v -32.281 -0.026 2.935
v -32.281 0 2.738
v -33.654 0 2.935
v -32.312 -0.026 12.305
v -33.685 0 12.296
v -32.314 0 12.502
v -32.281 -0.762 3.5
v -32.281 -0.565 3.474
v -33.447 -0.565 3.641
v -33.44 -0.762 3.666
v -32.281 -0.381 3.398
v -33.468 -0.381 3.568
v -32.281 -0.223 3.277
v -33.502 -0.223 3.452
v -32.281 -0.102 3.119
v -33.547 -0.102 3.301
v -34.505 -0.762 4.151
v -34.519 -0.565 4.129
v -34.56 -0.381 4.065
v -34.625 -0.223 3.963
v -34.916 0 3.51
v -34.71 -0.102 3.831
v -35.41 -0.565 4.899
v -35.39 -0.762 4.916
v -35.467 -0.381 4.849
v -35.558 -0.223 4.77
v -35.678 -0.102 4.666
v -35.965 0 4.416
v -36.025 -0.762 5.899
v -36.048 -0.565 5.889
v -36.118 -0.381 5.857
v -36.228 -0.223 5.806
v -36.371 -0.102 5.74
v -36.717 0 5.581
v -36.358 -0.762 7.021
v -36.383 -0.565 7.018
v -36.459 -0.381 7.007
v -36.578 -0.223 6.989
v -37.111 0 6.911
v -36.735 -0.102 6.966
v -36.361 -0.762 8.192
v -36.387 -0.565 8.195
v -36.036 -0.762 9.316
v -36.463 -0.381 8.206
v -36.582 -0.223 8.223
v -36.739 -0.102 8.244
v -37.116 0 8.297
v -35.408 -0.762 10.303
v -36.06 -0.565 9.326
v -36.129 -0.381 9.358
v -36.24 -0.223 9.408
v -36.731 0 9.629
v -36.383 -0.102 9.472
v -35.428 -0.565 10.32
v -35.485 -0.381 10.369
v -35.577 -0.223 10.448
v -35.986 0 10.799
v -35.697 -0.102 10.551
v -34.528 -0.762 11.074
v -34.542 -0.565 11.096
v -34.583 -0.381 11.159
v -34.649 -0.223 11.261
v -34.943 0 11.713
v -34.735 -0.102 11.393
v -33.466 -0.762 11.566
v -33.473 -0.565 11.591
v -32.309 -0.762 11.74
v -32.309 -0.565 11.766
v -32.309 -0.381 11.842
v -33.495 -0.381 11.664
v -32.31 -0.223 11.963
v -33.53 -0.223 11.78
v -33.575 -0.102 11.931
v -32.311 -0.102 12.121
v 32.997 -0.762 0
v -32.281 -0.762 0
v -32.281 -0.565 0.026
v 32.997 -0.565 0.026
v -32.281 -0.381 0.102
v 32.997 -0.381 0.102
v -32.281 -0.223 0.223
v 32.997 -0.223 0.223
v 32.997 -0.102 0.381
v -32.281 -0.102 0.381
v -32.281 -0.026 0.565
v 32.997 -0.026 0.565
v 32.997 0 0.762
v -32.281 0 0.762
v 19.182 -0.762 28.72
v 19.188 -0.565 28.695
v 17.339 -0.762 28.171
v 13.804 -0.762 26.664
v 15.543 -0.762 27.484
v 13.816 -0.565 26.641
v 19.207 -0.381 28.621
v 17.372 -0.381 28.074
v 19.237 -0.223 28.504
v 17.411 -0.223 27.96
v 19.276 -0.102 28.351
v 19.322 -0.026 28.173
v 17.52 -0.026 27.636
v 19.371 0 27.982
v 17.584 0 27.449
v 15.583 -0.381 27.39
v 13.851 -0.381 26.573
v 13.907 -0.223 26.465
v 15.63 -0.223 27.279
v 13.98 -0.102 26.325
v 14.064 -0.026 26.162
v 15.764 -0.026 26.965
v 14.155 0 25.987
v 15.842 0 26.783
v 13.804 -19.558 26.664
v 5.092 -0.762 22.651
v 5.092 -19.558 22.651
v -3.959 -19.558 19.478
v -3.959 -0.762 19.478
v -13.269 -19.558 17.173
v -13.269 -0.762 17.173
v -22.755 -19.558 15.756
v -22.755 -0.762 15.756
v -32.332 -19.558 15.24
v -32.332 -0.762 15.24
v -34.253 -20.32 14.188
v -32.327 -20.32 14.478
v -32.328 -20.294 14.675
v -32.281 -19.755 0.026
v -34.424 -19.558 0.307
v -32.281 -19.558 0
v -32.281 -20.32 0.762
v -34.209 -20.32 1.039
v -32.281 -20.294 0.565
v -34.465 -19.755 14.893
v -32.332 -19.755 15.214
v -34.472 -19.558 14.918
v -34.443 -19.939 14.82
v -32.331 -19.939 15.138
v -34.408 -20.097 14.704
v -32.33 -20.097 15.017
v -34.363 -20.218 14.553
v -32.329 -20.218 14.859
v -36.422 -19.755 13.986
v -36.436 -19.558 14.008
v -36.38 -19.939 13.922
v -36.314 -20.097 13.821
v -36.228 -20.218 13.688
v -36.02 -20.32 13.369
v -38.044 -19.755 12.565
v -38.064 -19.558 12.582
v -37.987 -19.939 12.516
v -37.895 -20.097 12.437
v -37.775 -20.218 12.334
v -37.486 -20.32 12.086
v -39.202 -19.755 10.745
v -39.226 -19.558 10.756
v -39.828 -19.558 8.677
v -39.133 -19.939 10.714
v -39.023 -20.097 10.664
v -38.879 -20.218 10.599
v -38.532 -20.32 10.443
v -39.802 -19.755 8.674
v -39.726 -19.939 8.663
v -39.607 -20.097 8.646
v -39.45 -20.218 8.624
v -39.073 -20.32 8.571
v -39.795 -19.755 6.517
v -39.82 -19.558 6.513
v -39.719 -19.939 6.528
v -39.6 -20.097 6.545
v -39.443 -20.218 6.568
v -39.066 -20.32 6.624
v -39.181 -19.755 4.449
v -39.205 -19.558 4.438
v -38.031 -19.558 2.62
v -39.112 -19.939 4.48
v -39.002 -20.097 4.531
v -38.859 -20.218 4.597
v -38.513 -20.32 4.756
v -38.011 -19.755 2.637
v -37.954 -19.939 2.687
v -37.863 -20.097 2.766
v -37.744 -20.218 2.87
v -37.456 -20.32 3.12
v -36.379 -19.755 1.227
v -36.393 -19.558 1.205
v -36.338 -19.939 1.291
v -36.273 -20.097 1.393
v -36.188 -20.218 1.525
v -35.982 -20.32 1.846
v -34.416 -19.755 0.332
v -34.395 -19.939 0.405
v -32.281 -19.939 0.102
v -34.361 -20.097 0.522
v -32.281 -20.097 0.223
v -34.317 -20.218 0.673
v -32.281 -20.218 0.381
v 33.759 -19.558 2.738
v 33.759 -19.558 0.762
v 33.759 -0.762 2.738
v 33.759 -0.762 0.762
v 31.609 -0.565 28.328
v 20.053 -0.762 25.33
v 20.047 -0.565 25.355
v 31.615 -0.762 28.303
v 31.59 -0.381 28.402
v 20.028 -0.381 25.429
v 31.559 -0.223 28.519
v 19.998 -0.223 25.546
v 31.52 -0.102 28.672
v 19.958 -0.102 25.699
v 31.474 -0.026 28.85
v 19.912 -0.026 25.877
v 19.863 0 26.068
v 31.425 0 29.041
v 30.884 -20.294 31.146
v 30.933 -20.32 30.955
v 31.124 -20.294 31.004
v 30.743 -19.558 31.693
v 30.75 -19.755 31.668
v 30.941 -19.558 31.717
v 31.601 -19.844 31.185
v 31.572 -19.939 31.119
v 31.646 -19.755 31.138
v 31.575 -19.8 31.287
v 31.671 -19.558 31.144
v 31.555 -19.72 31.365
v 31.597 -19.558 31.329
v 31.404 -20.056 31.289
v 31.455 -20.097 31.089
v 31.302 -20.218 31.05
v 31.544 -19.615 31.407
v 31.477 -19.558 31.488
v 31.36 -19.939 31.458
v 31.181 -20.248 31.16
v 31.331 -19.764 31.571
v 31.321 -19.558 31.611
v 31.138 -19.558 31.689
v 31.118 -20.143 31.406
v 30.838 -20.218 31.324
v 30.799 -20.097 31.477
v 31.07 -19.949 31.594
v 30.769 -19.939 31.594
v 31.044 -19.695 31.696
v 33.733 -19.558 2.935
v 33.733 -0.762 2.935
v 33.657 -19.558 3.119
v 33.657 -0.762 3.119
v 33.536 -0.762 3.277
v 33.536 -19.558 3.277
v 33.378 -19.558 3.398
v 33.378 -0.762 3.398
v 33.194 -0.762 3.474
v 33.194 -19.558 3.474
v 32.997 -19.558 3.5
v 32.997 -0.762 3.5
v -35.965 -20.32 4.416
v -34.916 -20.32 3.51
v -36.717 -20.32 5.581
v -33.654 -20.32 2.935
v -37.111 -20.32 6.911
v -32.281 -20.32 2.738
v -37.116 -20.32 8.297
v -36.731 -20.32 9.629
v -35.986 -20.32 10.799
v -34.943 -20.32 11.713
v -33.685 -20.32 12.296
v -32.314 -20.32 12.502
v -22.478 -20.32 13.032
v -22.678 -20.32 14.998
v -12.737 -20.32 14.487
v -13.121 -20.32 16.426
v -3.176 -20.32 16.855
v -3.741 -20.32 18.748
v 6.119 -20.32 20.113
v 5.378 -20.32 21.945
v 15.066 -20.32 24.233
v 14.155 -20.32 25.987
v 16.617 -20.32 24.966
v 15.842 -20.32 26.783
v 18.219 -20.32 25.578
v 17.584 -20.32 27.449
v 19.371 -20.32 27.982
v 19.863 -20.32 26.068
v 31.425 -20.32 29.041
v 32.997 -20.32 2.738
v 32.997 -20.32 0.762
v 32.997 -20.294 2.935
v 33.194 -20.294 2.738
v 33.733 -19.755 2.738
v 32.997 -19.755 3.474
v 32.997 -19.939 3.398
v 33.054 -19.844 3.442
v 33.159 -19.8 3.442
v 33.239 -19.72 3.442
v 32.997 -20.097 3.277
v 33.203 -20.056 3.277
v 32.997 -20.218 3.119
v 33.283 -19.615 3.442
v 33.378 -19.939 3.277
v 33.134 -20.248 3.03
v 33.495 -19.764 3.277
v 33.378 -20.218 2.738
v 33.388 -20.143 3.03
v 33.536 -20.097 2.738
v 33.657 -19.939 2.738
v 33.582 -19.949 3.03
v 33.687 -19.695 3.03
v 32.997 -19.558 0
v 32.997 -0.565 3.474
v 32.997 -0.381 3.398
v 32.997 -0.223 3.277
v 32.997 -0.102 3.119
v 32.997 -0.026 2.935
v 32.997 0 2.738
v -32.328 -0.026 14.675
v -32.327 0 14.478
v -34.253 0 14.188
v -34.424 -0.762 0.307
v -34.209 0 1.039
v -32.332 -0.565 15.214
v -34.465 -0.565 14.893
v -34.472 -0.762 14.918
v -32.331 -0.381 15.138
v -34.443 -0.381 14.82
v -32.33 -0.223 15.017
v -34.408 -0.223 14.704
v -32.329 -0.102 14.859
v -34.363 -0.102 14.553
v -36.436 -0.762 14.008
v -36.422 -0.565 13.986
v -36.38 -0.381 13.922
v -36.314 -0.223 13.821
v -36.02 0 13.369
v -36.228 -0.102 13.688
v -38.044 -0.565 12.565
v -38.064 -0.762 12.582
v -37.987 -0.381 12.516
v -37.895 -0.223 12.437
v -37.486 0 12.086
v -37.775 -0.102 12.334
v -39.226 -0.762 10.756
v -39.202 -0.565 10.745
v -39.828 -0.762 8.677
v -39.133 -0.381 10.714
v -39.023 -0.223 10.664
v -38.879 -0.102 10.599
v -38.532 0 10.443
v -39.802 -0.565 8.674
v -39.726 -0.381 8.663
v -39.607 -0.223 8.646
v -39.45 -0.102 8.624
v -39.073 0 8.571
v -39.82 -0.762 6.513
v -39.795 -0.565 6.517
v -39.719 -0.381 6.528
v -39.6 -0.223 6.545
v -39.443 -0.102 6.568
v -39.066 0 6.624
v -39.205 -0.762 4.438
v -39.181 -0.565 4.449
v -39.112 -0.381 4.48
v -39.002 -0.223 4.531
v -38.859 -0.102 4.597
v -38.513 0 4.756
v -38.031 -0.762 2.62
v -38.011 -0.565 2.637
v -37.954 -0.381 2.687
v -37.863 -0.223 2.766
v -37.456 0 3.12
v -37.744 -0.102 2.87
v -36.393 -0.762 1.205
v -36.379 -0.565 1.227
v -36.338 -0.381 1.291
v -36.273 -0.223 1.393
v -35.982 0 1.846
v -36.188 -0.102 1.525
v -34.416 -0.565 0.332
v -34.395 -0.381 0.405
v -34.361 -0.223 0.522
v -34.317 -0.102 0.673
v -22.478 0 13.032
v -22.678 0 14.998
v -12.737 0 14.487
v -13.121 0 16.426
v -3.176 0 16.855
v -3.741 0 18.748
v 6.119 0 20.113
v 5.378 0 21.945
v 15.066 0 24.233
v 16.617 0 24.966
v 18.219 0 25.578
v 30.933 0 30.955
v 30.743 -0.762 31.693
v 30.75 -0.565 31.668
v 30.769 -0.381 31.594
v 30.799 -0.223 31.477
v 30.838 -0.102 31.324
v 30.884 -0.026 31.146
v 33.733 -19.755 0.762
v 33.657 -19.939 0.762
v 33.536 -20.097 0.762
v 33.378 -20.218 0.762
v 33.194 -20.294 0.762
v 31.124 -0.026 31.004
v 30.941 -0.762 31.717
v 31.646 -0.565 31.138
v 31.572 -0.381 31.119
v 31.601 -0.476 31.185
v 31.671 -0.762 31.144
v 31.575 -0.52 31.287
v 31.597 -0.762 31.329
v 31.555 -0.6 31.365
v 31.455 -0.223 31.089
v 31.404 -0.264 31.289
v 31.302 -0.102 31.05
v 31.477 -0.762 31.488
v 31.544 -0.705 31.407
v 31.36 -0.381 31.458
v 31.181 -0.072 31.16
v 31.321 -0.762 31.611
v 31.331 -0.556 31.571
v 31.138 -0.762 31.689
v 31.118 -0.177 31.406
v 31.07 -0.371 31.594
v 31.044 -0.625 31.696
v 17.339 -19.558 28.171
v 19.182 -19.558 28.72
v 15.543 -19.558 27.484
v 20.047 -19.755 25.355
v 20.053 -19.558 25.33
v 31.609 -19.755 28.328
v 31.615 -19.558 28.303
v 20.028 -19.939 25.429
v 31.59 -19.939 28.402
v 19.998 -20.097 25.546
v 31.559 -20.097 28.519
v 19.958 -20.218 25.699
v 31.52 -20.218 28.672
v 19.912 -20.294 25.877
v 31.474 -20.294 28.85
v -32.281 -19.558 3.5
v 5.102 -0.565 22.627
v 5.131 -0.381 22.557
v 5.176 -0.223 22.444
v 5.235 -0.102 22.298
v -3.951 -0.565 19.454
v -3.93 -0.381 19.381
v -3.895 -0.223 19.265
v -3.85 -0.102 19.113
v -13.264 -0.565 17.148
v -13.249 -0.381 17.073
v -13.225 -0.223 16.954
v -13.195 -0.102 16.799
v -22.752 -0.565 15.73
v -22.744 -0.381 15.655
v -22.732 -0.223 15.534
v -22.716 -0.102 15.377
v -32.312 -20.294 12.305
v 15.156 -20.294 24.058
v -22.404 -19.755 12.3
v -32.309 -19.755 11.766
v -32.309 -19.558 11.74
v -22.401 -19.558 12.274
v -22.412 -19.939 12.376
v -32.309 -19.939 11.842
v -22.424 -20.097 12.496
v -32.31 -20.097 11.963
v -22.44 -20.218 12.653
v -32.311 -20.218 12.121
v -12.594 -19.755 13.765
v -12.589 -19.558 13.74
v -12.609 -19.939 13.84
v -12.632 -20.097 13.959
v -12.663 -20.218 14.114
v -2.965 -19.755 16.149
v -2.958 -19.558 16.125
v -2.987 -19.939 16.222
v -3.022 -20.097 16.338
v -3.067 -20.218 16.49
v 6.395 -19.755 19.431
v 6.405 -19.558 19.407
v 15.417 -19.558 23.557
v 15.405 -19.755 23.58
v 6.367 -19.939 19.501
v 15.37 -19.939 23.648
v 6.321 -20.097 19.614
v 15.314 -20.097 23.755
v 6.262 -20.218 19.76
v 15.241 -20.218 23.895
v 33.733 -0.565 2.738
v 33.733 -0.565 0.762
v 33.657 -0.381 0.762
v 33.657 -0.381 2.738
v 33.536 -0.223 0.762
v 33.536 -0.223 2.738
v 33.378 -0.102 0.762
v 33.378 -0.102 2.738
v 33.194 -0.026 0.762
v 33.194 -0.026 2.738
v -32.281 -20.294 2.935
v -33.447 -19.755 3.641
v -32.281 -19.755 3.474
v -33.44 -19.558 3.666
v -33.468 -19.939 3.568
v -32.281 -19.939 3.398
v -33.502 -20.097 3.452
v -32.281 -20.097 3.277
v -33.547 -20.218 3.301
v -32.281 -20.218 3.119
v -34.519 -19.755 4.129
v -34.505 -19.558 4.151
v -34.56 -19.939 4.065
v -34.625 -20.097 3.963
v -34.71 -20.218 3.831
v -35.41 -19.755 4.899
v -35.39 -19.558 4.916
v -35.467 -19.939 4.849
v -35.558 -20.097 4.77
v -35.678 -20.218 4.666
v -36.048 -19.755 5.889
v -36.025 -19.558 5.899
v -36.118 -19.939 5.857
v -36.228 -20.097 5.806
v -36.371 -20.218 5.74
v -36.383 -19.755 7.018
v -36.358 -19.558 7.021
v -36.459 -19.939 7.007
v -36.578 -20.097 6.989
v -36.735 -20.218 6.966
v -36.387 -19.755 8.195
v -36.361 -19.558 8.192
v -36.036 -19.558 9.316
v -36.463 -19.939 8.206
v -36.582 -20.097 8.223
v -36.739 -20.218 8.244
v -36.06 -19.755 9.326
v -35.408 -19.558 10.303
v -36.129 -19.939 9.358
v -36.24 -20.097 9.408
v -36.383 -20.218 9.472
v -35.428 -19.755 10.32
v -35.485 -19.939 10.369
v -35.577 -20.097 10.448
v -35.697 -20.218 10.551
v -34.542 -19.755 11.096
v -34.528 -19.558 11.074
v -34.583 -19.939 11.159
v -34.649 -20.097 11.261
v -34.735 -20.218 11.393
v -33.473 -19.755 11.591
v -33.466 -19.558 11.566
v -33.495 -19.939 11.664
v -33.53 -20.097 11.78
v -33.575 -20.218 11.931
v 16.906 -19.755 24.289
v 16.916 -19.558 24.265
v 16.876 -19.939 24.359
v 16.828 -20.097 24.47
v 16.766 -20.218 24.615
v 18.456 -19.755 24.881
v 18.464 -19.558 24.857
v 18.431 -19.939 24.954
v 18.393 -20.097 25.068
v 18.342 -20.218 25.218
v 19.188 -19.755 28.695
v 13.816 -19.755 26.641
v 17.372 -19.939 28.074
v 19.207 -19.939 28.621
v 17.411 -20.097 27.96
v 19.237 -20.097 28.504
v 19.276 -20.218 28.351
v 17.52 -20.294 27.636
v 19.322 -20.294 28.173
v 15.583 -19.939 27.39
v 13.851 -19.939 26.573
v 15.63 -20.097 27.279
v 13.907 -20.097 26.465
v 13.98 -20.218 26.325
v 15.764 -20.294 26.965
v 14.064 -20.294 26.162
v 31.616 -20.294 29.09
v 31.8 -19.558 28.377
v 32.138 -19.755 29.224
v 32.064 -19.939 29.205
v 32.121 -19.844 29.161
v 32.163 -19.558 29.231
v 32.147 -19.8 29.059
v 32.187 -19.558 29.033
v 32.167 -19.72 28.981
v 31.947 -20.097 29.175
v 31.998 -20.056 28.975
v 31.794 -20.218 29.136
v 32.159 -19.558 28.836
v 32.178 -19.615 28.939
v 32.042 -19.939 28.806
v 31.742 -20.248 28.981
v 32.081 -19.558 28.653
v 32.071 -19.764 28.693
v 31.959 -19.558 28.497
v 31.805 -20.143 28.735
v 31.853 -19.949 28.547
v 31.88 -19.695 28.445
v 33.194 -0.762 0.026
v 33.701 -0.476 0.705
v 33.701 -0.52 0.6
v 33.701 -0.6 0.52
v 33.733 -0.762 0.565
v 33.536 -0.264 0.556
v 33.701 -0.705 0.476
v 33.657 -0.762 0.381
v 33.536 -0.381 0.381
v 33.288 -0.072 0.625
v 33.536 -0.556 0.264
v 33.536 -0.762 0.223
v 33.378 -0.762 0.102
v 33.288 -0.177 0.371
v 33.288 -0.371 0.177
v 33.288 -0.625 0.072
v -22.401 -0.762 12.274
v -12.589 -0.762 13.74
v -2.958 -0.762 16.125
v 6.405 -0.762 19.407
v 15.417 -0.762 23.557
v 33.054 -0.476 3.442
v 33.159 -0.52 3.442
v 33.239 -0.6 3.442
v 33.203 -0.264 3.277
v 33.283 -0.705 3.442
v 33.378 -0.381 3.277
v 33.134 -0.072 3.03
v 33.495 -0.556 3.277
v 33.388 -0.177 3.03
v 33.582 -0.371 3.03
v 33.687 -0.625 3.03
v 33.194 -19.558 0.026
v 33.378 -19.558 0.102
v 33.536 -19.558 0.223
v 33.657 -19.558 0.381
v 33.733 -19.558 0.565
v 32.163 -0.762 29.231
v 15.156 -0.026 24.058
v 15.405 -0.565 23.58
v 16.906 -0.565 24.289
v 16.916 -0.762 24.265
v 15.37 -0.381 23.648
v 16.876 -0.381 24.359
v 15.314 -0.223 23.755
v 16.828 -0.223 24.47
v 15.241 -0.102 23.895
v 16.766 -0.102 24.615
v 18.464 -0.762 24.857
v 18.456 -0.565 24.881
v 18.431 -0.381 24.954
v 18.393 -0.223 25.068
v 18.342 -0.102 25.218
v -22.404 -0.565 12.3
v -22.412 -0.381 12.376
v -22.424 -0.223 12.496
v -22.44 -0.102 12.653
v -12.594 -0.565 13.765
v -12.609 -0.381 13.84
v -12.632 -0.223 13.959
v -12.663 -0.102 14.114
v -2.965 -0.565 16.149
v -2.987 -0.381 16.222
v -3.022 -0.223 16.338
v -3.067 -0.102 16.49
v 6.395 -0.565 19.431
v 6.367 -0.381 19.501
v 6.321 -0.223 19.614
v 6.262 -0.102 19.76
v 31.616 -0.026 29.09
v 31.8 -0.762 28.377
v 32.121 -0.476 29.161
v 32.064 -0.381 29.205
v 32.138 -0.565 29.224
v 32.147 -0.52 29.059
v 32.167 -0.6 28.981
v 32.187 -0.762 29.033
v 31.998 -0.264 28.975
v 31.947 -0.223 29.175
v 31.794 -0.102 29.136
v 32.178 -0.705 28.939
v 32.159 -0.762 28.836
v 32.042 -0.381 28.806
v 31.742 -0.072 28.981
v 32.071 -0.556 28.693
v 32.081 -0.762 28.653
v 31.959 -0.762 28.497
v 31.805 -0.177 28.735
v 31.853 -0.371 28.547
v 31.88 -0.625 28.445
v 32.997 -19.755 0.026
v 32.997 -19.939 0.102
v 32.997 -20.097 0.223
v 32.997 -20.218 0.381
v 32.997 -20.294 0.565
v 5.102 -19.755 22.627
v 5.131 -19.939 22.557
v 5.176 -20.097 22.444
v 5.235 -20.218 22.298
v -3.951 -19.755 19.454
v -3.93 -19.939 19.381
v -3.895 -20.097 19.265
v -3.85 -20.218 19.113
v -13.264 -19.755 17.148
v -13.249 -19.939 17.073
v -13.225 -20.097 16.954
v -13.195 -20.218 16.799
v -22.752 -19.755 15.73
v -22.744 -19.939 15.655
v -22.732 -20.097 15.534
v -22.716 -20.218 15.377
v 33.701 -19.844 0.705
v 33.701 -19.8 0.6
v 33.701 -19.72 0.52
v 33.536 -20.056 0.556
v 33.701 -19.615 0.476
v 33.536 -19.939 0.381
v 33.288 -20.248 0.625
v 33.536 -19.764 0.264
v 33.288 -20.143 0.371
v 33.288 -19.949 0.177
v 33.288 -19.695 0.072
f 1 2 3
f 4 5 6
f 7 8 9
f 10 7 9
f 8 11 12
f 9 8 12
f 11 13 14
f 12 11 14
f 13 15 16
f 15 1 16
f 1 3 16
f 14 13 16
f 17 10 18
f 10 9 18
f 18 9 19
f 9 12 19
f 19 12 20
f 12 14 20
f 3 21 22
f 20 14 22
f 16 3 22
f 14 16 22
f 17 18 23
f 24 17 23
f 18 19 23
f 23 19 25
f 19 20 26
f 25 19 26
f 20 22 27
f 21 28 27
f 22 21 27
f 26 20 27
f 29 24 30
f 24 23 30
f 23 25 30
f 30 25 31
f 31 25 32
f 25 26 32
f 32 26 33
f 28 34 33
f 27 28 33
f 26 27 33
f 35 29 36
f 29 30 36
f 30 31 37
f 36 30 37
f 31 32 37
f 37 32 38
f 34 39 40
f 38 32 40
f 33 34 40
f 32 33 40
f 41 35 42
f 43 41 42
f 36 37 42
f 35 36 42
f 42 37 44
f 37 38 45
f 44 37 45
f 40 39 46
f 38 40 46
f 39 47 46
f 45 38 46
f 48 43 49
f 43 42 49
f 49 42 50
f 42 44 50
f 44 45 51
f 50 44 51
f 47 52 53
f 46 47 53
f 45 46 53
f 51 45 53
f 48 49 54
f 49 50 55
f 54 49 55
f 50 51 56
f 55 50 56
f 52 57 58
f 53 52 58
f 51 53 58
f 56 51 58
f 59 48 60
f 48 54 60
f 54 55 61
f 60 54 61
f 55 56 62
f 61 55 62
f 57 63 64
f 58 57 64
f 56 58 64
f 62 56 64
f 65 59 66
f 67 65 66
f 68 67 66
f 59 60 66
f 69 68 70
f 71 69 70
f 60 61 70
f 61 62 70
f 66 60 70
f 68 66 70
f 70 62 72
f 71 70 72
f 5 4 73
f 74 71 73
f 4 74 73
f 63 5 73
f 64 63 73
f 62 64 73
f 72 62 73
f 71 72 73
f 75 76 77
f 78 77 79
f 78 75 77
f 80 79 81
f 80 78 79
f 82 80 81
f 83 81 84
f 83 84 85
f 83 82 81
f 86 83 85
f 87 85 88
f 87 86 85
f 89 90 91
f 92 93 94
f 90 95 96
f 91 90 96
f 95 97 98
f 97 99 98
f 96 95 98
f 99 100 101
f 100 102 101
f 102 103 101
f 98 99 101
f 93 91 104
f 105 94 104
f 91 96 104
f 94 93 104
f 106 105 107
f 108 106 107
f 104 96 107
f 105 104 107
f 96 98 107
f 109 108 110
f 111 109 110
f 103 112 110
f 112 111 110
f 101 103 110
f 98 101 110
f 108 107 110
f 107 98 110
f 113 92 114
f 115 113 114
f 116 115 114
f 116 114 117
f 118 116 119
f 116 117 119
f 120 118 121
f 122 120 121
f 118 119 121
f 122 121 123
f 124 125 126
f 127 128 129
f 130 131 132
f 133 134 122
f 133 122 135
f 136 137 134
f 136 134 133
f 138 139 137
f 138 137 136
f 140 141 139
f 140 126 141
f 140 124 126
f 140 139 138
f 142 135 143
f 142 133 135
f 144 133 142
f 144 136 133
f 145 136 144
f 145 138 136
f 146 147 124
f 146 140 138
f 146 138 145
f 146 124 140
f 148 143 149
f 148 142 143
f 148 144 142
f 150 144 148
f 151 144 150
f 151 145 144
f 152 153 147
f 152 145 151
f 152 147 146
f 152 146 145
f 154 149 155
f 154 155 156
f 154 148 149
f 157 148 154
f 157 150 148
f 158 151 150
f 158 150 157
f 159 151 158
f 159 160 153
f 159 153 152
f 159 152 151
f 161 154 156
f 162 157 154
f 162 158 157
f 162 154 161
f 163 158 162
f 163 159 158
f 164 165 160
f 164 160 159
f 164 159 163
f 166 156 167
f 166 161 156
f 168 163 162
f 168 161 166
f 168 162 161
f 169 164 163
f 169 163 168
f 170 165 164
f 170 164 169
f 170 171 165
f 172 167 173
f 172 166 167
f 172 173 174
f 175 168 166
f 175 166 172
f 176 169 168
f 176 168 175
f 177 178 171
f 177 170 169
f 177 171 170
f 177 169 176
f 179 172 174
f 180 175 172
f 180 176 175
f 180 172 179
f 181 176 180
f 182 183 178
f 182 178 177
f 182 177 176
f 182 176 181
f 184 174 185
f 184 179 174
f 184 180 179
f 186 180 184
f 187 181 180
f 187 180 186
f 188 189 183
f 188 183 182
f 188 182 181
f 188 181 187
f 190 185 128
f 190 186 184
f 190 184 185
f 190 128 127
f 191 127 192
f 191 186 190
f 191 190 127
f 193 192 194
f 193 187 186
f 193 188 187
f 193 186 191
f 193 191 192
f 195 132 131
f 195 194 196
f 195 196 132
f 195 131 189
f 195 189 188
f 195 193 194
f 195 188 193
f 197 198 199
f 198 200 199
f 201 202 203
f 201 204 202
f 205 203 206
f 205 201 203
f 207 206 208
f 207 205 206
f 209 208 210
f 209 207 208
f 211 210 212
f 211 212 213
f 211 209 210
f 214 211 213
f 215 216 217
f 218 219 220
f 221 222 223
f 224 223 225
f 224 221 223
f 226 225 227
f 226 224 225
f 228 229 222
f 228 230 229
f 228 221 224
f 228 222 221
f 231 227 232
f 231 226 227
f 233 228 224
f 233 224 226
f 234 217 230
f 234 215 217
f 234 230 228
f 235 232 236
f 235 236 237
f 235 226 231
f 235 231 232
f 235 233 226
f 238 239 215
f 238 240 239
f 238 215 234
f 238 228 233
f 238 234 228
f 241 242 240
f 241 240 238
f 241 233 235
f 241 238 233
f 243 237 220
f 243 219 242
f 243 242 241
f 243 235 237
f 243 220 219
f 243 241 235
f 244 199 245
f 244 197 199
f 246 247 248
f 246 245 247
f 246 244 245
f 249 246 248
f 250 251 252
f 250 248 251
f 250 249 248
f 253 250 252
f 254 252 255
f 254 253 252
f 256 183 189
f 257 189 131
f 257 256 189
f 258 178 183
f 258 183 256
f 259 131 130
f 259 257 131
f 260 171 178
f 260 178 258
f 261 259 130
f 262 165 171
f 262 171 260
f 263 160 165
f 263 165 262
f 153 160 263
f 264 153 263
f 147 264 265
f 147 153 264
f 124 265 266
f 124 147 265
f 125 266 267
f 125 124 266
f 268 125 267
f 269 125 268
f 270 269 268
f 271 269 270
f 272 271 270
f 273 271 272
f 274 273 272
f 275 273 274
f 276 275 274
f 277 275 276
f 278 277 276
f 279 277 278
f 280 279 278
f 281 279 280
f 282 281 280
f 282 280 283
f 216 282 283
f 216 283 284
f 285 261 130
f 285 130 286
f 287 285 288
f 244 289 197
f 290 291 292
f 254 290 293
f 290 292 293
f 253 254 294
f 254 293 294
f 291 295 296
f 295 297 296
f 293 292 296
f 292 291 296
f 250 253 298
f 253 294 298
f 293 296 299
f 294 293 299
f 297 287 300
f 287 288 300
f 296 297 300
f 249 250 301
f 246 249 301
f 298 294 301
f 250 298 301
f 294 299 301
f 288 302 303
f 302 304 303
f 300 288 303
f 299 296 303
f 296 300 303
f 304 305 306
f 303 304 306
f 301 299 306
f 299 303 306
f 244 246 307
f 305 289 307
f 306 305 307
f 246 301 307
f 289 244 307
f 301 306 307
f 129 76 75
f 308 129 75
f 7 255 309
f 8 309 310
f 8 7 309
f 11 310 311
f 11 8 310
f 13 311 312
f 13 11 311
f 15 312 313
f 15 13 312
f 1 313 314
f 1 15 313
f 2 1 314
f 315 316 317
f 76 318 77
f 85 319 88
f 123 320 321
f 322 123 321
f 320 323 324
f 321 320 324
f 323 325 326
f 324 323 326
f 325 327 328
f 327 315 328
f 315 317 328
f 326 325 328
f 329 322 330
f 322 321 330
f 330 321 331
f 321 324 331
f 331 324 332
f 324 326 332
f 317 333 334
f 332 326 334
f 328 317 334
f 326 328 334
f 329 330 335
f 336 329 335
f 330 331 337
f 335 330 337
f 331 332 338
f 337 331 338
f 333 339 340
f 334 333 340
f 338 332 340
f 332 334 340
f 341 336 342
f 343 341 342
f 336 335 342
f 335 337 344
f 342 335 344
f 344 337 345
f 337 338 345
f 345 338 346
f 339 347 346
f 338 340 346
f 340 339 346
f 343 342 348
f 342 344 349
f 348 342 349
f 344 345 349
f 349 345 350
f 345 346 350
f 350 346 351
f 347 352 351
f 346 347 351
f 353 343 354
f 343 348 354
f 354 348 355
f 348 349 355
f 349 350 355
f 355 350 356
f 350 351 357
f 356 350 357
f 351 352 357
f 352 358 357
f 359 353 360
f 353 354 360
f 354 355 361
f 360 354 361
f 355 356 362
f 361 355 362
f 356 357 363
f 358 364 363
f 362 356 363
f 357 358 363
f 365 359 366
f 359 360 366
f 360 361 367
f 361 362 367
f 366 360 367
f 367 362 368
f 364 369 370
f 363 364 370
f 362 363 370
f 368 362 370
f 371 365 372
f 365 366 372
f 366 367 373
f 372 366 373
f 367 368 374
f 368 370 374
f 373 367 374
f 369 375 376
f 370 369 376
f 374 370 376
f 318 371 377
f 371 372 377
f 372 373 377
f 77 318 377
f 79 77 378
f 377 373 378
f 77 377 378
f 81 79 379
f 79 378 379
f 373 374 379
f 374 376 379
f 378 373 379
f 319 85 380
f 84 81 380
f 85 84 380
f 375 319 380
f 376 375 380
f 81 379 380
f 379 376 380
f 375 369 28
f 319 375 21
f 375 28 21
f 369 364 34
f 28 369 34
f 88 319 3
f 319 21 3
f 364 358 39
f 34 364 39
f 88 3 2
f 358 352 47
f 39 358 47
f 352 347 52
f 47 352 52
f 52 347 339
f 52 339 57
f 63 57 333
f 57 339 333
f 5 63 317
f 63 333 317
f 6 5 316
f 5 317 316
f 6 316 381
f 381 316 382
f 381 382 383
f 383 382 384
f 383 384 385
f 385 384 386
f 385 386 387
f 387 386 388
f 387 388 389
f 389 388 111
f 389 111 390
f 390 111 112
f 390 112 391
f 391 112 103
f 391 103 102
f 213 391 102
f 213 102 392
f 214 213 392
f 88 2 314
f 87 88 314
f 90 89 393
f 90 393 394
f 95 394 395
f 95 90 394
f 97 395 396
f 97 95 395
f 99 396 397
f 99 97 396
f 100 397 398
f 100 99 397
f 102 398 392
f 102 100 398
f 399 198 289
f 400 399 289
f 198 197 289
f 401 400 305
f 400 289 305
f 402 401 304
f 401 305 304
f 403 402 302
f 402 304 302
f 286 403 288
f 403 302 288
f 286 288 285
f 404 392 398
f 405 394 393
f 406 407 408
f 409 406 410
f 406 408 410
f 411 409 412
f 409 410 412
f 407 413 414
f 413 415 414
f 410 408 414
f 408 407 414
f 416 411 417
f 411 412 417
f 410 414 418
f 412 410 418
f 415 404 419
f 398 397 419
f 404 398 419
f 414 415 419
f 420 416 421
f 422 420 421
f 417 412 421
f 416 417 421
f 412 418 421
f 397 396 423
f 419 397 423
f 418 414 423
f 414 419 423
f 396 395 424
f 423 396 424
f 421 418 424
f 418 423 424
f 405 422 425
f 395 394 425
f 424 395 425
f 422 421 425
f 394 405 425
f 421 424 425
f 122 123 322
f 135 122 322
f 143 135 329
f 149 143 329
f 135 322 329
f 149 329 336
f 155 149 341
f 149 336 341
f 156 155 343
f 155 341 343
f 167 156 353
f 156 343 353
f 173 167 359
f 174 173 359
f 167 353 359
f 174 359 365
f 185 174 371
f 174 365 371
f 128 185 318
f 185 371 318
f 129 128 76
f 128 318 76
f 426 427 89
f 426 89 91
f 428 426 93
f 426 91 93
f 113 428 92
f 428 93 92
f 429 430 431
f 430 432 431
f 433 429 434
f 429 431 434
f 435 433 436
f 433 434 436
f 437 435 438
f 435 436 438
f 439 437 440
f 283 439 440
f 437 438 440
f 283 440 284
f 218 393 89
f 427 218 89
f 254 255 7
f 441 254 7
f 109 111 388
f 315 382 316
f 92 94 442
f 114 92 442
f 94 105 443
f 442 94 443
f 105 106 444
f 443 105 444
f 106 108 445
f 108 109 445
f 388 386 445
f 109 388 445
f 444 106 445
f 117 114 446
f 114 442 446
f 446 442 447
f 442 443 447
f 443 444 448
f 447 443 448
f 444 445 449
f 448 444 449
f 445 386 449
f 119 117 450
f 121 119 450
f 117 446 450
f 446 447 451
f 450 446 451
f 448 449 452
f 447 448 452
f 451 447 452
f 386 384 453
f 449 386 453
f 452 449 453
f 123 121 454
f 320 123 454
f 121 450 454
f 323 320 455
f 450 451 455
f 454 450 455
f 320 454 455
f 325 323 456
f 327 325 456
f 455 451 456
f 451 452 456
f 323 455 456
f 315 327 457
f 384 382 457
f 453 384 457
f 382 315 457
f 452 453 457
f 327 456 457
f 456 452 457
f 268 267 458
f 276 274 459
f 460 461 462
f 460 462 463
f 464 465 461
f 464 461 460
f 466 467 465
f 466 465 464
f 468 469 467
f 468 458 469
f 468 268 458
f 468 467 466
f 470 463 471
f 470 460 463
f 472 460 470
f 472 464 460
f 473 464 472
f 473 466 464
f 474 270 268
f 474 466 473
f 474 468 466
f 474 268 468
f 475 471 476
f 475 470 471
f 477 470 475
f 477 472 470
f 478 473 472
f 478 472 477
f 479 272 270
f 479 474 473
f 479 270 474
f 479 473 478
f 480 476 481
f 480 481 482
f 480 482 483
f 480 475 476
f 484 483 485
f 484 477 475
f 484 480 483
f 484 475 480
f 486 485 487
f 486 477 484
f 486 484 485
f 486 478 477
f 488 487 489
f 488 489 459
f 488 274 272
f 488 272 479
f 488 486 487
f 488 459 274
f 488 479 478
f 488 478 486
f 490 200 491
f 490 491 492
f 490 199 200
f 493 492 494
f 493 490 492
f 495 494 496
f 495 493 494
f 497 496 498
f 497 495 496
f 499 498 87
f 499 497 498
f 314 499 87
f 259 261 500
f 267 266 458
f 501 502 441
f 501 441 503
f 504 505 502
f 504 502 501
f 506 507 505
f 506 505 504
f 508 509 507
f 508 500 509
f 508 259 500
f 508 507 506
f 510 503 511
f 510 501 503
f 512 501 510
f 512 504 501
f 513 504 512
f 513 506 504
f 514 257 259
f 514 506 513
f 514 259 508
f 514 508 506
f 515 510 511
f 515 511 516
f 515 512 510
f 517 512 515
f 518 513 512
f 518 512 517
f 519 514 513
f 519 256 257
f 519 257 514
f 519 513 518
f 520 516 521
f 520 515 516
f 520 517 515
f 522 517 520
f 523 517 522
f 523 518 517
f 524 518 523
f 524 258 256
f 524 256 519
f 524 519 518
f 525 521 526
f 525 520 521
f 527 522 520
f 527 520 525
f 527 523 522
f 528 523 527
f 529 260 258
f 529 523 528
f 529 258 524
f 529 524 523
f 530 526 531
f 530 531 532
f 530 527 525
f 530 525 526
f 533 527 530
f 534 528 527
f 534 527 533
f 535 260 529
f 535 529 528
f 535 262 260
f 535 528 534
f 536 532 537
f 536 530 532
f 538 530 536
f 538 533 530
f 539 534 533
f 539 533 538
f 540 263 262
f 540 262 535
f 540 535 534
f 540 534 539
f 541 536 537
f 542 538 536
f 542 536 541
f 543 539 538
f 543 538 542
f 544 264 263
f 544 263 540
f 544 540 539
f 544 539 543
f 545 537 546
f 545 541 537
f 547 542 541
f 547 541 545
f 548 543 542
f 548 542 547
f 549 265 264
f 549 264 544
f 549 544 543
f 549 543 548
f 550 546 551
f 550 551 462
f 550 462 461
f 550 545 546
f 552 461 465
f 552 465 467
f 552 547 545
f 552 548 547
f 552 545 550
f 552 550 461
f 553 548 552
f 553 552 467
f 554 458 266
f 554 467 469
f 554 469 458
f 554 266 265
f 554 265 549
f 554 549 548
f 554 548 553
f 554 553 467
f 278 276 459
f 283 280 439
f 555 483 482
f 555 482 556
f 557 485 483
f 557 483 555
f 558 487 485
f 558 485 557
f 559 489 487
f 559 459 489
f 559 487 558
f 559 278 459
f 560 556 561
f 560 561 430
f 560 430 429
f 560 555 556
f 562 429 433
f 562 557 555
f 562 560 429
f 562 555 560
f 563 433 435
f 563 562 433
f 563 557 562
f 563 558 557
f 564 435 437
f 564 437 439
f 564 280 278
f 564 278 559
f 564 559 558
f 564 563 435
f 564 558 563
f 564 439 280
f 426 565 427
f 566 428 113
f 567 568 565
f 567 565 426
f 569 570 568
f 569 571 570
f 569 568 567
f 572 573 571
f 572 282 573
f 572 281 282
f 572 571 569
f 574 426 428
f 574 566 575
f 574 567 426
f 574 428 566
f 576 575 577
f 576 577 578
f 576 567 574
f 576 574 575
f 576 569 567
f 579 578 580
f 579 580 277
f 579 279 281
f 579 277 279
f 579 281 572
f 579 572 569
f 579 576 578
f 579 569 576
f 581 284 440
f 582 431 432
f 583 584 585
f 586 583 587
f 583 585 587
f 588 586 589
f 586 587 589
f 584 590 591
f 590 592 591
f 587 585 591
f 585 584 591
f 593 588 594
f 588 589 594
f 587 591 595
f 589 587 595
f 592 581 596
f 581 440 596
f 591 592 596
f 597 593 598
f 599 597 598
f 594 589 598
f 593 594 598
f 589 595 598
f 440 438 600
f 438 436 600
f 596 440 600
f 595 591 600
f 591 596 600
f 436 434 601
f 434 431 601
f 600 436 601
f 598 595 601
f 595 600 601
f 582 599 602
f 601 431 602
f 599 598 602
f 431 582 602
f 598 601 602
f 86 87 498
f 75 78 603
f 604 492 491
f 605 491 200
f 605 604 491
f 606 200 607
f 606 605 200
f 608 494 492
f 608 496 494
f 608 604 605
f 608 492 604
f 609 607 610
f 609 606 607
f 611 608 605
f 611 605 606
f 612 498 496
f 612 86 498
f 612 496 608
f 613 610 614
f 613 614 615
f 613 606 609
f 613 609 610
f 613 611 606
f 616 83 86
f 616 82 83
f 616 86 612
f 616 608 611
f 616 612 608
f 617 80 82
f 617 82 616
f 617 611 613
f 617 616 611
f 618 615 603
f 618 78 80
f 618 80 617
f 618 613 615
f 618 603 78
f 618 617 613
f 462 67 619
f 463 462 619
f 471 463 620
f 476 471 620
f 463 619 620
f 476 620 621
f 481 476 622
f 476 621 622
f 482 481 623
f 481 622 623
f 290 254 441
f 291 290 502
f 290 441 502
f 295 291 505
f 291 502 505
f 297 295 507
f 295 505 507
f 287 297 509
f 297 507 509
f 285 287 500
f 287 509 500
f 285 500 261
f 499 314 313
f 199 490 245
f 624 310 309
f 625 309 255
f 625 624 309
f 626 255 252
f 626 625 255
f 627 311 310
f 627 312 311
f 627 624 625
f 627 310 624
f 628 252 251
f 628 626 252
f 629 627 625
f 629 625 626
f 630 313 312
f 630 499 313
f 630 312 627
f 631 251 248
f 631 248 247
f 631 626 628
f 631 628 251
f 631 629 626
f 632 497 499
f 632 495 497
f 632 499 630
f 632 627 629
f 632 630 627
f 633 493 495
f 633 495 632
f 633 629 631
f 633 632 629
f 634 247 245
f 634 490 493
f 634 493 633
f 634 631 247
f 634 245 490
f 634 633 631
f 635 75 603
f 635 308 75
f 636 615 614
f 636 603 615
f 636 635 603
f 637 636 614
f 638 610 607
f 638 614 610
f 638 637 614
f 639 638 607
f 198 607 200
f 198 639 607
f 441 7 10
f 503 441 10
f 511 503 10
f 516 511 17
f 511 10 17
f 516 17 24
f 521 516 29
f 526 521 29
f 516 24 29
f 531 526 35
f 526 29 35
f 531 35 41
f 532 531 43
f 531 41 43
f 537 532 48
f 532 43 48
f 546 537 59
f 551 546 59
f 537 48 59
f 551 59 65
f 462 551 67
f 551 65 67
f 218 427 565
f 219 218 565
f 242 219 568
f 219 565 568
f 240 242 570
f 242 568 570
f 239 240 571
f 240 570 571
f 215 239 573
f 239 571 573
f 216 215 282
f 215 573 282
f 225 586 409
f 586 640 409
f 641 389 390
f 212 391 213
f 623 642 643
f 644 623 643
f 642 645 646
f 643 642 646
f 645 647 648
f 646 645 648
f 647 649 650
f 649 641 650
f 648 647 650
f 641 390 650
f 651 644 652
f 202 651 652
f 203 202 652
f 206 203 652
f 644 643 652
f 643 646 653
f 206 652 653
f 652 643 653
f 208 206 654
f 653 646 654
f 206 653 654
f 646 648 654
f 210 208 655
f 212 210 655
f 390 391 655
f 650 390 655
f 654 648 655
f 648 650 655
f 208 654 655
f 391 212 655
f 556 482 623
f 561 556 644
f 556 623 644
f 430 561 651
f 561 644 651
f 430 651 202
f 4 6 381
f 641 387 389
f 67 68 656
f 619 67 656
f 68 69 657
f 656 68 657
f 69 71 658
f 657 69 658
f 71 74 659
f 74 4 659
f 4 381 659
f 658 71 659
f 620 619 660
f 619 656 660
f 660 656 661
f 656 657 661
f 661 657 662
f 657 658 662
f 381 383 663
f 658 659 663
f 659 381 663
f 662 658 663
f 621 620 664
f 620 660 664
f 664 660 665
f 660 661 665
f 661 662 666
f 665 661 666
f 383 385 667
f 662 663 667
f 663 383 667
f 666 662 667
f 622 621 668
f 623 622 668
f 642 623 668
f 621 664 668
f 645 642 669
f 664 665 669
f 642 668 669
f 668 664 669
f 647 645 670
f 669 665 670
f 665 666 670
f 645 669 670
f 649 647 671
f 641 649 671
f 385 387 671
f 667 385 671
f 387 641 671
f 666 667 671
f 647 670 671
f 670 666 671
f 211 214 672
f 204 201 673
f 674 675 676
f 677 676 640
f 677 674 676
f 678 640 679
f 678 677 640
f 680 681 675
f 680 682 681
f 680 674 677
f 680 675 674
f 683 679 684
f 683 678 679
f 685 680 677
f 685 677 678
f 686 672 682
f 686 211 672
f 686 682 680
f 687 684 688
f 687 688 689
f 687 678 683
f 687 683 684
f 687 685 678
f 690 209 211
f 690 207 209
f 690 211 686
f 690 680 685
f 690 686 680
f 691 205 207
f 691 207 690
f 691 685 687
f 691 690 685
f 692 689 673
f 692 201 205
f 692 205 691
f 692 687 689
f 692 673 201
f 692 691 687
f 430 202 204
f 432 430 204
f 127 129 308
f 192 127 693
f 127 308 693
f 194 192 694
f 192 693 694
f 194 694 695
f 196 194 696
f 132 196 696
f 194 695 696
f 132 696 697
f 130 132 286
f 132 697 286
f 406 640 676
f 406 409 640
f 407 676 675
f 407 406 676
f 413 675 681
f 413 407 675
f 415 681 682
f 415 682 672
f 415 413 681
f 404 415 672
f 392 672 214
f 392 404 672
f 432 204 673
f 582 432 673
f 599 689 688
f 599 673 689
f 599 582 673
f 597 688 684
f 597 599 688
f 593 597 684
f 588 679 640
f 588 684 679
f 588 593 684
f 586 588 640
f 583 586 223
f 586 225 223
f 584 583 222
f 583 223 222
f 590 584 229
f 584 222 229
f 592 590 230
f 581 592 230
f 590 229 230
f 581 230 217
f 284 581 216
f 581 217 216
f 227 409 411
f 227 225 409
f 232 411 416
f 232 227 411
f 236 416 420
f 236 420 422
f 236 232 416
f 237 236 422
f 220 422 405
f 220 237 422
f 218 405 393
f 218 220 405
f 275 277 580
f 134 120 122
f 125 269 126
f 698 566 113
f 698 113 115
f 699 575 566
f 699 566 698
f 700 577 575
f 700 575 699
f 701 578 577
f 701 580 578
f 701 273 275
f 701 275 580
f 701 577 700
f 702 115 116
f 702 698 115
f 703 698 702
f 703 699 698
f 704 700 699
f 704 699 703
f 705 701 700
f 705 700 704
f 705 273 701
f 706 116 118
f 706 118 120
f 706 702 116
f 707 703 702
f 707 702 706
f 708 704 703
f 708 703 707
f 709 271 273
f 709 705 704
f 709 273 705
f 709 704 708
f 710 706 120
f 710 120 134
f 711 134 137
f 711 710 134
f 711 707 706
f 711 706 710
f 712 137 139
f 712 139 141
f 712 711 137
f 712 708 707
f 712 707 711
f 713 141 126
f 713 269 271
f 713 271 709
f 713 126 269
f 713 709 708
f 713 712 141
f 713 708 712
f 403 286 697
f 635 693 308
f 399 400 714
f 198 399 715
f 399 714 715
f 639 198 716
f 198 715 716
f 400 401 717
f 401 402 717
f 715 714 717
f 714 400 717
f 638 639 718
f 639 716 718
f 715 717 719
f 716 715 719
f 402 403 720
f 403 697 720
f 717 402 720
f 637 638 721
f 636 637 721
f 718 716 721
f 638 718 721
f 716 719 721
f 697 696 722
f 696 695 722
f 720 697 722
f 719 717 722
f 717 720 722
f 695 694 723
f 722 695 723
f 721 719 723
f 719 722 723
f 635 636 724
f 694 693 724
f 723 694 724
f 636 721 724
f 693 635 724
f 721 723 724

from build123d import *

# Parameters (mm, degrees)
F1_DEPTH = 20.32
F2_R     = 0.762


with BuildPart() as f1:
    # F0 (on Front) → F1 (new body)
    with BuildSketch(Plane.XZ):
        with BuildLine():
            Line((-32.2812777423, 0), (33.7587222577, 0))
            Line((33.7587222577, 0), (33.7587222577, 3.5))
            Line((33.7587222577, 3.5), (-32.2812777423, 3.5))
            ThreePointArc((-32.2812777423, 3.5), (-36.4012550506, 7.6063259449), (-32.308625702, 11.7399092331))
            ThreePointArc((-32.308625702, 11.7399092331), (-7.7452704082, 14.8185162016), (15.4165966965, 23.5571749303))
            ThreePointArc((15.4165966965, 23.5571749303), (17.6844448263, 24.575463703), (20.0530860269, 25.3301729364))
            Line((20.0530860269, 25.3301729364), (32.3530167072, 28.49272021))
            Line((32.3530167072, 28.49272021), (31.481448561, 31.8824648857))
            Line((31.481448561, 31.8824648857), (19.1815178806, 28.7199176121))
            ThreePointArc((19.1815178806, 28.7199176121), (16.4343267164, 27.8445927478), (13.8040371048, 26.6635637603))
            ThreePointArc((13.8040371048, 26.6635637603), (-8.5865023609, 18.215916502), (-32.331858192, 15.2398321253))
            ThreePointArc((-32.331858192, 15.2398321253), (-39.9012357736, 7.5947096359), (-32.2812777423, 0))
        make_face()
    extrude(amount=F1_DEPTH)

    # F2
    f2_edges = [f1.edges().sort_by_distance(p)[0] for p in [
        (16.434327, -20.32, 27.844593),
        (-8.586502, -20.32, 18.215917),
        (-39.901236, -20.32, 7.59471),
        (0.738722, -20.32, 0),
        (33.758722, -20.32, 1.75),
        (0.738722, -20.32, 3.5),
        (-36.401255, -20.32, 7.606326),
        (-7.74527, -20.32, 14.818516),
        (17.684445, -20.32, 24.575464),
        (26.203051, -20.32, 26.911447),
        (31.917233, -20.32, 30.187593),
        (25.331483, -20.32, 30.301191),
        (16.434327, 0, 27.844593),
        (-8.586502, 0, 18.215917),
        (-39.901236, 0, 7.59471),
        (0.738722, 0, 0),
        (33.758722, 0, 1.75),
        (0.738722, 0, 3.5),
        (-36.401255, 0, 7.606326),
        (-7.74527, 0, 14.818516),
        (17.684445, 0, 24.575464),
        (26.203051, 0, 26.911447),
        (31.917233, 0, 30.187593),
        (25.331483, 0, 30.301191),
        (32.353017, -10.16, 28.49272),
        (31.481449, -10.16, 31.882465),
        (33.758722, -10.16, 0),
        (33.758722, -10.16, 3.5),
    ]]
    fillet(f2_edges, radius=F2_R)


solid = f1.part
